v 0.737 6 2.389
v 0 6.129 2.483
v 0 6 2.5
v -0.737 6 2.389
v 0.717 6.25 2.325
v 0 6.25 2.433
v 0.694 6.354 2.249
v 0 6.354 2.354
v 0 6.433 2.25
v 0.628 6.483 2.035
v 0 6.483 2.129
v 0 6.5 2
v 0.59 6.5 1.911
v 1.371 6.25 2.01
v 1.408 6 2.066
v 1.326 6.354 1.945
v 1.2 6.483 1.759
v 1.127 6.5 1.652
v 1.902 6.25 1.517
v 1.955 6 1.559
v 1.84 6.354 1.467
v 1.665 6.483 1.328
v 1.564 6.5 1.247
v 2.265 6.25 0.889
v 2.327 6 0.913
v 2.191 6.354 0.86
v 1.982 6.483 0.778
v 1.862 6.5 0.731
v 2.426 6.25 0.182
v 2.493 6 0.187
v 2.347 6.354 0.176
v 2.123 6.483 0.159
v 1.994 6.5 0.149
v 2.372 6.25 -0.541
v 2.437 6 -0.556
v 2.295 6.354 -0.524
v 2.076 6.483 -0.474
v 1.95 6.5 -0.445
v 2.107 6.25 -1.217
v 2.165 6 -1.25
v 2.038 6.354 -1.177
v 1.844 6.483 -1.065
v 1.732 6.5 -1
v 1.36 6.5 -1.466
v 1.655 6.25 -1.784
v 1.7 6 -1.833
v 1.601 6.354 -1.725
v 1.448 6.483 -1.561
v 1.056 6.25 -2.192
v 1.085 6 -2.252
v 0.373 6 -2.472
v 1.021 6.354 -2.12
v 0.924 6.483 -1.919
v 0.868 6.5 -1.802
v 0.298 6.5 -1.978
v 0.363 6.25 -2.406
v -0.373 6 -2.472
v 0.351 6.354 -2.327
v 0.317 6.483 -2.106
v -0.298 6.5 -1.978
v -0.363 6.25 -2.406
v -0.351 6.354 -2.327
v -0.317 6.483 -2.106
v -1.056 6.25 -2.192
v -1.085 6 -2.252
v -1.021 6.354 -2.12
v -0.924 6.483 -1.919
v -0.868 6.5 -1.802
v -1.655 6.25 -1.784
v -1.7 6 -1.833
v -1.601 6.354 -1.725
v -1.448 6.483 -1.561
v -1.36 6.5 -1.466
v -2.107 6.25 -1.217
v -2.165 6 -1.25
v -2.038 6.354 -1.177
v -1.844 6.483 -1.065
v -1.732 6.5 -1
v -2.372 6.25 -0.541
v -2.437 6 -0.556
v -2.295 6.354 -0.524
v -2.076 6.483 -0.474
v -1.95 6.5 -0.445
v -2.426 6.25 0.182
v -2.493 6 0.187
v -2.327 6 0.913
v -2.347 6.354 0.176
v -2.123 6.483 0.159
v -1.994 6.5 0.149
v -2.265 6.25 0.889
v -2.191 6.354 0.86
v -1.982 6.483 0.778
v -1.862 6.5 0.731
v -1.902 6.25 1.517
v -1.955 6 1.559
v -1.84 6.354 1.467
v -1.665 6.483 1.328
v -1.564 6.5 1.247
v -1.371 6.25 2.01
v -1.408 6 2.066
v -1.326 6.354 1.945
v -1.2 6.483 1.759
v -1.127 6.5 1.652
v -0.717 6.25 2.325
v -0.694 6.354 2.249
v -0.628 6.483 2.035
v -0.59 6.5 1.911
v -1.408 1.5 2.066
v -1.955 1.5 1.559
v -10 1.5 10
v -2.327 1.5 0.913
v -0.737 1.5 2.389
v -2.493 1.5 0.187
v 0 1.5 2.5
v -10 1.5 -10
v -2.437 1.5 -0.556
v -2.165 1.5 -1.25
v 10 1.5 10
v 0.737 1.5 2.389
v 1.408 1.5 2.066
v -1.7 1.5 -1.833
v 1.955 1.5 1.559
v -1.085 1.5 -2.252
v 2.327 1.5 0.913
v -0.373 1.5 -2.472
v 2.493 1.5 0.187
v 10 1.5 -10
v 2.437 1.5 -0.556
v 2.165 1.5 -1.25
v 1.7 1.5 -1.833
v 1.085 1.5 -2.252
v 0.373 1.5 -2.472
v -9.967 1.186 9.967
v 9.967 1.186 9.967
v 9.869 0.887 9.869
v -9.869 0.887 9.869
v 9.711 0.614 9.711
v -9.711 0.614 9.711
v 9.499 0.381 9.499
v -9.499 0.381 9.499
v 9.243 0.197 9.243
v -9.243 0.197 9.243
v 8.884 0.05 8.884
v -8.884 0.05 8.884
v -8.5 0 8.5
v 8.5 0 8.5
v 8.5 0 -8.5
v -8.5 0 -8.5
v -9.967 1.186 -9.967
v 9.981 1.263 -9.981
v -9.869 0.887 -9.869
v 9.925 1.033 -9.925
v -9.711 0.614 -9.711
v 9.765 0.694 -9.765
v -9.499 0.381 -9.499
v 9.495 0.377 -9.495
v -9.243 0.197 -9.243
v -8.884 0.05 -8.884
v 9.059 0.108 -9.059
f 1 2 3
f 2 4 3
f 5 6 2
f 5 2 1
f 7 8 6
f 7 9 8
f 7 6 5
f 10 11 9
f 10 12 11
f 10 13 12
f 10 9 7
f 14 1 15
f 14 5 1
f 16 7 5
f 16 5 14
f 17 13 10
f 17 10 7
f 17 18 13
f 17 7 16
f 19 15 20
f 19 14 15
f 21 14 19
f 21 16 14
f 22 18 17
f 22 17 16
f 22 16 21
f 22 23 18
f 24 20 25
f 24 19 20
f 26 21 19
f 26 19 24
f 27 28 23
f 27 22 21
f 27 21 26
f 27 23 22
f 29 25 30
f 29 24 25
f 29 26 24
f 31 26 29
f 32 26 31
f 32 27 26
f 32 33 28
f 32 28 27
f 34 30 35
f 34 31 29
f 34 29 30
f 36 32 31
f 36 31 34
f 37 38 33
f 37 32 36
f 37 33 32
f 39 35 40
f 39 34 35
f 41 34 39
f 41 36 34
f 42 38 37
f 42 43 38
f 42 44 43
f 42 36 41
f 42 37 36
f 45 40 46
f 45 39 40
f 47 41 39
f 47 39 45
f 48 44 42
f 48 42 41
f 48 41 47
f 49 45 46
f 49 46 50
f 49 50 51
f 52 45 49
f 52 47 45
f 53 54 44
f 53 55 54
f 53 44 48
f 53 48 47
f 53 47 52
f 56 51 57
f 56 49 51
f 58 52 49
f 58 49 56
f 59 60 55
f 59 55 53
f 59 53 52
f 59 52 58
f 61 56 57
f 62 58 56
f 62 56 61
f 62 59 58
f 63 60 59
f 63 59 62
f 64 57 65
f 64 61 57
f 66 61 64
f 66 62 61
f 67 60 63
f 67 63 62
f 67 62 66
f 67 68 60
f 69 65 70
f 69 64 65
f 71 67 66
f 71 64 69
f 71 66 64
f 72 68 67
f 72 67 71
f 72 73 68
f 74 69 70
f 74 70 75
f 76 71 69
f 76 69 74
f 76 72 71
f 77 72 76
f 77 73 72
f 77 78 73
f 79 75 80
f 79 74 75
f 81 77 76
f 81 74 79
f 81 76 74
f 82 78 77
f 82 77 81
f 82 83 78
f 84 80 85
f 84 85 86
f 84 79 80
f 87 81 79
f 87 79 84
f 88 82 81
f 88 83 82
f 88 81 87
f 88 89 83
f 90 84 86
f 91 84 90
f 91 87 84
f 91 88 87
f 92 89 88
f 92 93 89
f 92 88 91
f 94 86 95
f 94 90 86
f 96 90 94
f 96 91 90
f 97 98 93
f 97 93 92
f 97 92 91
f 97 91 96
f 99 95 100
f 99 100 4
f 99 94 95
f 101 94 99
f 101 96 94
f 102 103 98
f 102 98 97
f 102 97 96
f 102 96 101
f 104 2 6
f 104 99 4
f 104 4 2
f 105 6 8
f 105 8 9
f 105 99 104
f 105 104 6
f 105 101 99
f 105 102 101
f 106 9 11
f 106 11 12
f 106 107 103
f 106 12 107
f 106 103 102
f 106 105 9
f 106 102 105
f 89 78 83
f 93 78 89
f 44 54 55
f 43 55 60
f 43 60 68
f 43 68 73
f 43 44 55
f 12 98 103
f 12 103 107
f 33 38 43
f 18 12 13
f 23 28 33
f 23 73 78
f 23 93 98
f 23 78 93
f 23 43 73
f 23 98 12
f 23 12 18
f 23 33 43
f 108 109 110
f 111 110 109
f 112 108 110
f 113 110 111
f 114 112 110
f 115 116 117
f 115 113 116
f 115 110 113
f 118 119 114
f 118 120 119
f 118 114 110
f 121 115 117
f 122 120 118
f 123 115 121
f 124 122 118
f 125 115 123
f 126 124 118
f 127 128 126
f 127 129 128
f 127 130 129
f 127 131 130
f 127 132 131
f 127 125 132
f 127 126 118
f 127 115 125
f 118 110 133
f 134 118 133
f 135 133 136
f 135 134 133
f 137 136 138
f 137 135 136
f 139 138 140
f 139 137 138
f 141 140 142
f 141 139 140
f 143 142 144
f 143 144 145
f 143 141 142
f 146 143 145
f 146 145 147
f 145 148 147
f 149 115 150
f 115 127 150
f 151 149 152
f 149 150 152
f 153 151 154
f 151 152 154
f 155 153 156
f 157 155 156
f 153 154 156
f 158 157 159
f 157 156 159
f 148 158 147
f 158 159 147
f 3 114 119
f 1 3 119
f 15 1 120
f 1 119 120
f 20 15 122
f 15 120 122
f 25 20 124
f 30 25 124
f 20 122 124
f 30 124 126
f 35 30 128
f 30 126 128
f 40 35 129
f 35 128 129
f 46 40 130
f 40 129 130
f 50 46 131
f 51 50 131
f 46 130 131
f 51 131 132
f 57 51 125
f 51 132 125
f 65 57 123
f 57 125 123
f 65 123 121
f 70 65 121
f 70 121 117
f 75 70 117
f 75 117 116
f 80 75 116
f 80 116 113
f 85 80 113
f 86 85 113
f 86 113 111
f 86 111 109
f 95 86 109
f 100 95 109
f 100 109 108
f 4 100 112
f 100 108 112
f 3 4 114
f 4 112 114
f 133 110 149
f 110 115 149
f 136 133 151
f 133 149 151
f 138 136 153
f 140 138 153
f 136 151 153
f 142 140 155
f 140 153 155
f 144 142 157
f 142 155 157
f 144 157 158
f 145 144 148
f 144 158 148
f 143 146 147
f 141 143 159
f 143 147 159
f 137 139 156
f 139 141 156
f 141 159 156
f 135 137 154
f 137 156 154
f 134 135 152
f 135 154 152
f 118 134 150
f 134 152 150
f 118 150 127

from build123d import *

# Parameters (mm, degrees)
SKETCH_1_W      = 20
SKETCH_1_H      = 20
EXTRUDE_1_DEPTH = 1.5
SKETCH_2_R      = 2.5
EXTRUDE_2_DEPTH = 5
FILLET_1_R      = 1.5
FILLET_2_R      = 0.5


with BuildPart() as part:
    # 草图1 → 凸台-拉伸1 (new body)
    with BuildSketch(Plane(origin=(0, 0, 0), x_dir=(1, 0, 0), z_dir=(0, 1, 0))):
        Rectangle(SKETCH_1_W, SKETCH_1_H)
    extrude(amount=EXTRUDE_1_DEPTH)

    # 草图2 → 凸台-拉伸2 (add)
    with BuildSketch(Plane(origin=(0, 1.5, 0), x_dir=(1, 0, 0), z_dir=(0, 1, 0))):
        with Locations(Location((0, 0, 0), (0, 0, 270))):
            Circle(SKETCH_2_R)
    extrude(amount=EXTRUDE_2_DEPTH)

    # 圆角1
    fillet_1_edges = [part.edges().sort_by_distance(p)[0] for p in [
        (0, 0, 10),
        (10, 0, 0),
        (0, 0, -10),
        (-10, 0, 0),
    ]]
    fillet(fillet_1_edges, radius=FILLET_1_R - 0.0001)  # a hair under: the kernel refuses the full size

    # 圆角2
    fillet_2_edges = [part.edges().sort_by_distance(p)[0] for p in [
        (0, 6.5, -2.5),
    ]]
    fillet(fillet_2_edges, radius=FILLET_2_R)


solid = part.part
